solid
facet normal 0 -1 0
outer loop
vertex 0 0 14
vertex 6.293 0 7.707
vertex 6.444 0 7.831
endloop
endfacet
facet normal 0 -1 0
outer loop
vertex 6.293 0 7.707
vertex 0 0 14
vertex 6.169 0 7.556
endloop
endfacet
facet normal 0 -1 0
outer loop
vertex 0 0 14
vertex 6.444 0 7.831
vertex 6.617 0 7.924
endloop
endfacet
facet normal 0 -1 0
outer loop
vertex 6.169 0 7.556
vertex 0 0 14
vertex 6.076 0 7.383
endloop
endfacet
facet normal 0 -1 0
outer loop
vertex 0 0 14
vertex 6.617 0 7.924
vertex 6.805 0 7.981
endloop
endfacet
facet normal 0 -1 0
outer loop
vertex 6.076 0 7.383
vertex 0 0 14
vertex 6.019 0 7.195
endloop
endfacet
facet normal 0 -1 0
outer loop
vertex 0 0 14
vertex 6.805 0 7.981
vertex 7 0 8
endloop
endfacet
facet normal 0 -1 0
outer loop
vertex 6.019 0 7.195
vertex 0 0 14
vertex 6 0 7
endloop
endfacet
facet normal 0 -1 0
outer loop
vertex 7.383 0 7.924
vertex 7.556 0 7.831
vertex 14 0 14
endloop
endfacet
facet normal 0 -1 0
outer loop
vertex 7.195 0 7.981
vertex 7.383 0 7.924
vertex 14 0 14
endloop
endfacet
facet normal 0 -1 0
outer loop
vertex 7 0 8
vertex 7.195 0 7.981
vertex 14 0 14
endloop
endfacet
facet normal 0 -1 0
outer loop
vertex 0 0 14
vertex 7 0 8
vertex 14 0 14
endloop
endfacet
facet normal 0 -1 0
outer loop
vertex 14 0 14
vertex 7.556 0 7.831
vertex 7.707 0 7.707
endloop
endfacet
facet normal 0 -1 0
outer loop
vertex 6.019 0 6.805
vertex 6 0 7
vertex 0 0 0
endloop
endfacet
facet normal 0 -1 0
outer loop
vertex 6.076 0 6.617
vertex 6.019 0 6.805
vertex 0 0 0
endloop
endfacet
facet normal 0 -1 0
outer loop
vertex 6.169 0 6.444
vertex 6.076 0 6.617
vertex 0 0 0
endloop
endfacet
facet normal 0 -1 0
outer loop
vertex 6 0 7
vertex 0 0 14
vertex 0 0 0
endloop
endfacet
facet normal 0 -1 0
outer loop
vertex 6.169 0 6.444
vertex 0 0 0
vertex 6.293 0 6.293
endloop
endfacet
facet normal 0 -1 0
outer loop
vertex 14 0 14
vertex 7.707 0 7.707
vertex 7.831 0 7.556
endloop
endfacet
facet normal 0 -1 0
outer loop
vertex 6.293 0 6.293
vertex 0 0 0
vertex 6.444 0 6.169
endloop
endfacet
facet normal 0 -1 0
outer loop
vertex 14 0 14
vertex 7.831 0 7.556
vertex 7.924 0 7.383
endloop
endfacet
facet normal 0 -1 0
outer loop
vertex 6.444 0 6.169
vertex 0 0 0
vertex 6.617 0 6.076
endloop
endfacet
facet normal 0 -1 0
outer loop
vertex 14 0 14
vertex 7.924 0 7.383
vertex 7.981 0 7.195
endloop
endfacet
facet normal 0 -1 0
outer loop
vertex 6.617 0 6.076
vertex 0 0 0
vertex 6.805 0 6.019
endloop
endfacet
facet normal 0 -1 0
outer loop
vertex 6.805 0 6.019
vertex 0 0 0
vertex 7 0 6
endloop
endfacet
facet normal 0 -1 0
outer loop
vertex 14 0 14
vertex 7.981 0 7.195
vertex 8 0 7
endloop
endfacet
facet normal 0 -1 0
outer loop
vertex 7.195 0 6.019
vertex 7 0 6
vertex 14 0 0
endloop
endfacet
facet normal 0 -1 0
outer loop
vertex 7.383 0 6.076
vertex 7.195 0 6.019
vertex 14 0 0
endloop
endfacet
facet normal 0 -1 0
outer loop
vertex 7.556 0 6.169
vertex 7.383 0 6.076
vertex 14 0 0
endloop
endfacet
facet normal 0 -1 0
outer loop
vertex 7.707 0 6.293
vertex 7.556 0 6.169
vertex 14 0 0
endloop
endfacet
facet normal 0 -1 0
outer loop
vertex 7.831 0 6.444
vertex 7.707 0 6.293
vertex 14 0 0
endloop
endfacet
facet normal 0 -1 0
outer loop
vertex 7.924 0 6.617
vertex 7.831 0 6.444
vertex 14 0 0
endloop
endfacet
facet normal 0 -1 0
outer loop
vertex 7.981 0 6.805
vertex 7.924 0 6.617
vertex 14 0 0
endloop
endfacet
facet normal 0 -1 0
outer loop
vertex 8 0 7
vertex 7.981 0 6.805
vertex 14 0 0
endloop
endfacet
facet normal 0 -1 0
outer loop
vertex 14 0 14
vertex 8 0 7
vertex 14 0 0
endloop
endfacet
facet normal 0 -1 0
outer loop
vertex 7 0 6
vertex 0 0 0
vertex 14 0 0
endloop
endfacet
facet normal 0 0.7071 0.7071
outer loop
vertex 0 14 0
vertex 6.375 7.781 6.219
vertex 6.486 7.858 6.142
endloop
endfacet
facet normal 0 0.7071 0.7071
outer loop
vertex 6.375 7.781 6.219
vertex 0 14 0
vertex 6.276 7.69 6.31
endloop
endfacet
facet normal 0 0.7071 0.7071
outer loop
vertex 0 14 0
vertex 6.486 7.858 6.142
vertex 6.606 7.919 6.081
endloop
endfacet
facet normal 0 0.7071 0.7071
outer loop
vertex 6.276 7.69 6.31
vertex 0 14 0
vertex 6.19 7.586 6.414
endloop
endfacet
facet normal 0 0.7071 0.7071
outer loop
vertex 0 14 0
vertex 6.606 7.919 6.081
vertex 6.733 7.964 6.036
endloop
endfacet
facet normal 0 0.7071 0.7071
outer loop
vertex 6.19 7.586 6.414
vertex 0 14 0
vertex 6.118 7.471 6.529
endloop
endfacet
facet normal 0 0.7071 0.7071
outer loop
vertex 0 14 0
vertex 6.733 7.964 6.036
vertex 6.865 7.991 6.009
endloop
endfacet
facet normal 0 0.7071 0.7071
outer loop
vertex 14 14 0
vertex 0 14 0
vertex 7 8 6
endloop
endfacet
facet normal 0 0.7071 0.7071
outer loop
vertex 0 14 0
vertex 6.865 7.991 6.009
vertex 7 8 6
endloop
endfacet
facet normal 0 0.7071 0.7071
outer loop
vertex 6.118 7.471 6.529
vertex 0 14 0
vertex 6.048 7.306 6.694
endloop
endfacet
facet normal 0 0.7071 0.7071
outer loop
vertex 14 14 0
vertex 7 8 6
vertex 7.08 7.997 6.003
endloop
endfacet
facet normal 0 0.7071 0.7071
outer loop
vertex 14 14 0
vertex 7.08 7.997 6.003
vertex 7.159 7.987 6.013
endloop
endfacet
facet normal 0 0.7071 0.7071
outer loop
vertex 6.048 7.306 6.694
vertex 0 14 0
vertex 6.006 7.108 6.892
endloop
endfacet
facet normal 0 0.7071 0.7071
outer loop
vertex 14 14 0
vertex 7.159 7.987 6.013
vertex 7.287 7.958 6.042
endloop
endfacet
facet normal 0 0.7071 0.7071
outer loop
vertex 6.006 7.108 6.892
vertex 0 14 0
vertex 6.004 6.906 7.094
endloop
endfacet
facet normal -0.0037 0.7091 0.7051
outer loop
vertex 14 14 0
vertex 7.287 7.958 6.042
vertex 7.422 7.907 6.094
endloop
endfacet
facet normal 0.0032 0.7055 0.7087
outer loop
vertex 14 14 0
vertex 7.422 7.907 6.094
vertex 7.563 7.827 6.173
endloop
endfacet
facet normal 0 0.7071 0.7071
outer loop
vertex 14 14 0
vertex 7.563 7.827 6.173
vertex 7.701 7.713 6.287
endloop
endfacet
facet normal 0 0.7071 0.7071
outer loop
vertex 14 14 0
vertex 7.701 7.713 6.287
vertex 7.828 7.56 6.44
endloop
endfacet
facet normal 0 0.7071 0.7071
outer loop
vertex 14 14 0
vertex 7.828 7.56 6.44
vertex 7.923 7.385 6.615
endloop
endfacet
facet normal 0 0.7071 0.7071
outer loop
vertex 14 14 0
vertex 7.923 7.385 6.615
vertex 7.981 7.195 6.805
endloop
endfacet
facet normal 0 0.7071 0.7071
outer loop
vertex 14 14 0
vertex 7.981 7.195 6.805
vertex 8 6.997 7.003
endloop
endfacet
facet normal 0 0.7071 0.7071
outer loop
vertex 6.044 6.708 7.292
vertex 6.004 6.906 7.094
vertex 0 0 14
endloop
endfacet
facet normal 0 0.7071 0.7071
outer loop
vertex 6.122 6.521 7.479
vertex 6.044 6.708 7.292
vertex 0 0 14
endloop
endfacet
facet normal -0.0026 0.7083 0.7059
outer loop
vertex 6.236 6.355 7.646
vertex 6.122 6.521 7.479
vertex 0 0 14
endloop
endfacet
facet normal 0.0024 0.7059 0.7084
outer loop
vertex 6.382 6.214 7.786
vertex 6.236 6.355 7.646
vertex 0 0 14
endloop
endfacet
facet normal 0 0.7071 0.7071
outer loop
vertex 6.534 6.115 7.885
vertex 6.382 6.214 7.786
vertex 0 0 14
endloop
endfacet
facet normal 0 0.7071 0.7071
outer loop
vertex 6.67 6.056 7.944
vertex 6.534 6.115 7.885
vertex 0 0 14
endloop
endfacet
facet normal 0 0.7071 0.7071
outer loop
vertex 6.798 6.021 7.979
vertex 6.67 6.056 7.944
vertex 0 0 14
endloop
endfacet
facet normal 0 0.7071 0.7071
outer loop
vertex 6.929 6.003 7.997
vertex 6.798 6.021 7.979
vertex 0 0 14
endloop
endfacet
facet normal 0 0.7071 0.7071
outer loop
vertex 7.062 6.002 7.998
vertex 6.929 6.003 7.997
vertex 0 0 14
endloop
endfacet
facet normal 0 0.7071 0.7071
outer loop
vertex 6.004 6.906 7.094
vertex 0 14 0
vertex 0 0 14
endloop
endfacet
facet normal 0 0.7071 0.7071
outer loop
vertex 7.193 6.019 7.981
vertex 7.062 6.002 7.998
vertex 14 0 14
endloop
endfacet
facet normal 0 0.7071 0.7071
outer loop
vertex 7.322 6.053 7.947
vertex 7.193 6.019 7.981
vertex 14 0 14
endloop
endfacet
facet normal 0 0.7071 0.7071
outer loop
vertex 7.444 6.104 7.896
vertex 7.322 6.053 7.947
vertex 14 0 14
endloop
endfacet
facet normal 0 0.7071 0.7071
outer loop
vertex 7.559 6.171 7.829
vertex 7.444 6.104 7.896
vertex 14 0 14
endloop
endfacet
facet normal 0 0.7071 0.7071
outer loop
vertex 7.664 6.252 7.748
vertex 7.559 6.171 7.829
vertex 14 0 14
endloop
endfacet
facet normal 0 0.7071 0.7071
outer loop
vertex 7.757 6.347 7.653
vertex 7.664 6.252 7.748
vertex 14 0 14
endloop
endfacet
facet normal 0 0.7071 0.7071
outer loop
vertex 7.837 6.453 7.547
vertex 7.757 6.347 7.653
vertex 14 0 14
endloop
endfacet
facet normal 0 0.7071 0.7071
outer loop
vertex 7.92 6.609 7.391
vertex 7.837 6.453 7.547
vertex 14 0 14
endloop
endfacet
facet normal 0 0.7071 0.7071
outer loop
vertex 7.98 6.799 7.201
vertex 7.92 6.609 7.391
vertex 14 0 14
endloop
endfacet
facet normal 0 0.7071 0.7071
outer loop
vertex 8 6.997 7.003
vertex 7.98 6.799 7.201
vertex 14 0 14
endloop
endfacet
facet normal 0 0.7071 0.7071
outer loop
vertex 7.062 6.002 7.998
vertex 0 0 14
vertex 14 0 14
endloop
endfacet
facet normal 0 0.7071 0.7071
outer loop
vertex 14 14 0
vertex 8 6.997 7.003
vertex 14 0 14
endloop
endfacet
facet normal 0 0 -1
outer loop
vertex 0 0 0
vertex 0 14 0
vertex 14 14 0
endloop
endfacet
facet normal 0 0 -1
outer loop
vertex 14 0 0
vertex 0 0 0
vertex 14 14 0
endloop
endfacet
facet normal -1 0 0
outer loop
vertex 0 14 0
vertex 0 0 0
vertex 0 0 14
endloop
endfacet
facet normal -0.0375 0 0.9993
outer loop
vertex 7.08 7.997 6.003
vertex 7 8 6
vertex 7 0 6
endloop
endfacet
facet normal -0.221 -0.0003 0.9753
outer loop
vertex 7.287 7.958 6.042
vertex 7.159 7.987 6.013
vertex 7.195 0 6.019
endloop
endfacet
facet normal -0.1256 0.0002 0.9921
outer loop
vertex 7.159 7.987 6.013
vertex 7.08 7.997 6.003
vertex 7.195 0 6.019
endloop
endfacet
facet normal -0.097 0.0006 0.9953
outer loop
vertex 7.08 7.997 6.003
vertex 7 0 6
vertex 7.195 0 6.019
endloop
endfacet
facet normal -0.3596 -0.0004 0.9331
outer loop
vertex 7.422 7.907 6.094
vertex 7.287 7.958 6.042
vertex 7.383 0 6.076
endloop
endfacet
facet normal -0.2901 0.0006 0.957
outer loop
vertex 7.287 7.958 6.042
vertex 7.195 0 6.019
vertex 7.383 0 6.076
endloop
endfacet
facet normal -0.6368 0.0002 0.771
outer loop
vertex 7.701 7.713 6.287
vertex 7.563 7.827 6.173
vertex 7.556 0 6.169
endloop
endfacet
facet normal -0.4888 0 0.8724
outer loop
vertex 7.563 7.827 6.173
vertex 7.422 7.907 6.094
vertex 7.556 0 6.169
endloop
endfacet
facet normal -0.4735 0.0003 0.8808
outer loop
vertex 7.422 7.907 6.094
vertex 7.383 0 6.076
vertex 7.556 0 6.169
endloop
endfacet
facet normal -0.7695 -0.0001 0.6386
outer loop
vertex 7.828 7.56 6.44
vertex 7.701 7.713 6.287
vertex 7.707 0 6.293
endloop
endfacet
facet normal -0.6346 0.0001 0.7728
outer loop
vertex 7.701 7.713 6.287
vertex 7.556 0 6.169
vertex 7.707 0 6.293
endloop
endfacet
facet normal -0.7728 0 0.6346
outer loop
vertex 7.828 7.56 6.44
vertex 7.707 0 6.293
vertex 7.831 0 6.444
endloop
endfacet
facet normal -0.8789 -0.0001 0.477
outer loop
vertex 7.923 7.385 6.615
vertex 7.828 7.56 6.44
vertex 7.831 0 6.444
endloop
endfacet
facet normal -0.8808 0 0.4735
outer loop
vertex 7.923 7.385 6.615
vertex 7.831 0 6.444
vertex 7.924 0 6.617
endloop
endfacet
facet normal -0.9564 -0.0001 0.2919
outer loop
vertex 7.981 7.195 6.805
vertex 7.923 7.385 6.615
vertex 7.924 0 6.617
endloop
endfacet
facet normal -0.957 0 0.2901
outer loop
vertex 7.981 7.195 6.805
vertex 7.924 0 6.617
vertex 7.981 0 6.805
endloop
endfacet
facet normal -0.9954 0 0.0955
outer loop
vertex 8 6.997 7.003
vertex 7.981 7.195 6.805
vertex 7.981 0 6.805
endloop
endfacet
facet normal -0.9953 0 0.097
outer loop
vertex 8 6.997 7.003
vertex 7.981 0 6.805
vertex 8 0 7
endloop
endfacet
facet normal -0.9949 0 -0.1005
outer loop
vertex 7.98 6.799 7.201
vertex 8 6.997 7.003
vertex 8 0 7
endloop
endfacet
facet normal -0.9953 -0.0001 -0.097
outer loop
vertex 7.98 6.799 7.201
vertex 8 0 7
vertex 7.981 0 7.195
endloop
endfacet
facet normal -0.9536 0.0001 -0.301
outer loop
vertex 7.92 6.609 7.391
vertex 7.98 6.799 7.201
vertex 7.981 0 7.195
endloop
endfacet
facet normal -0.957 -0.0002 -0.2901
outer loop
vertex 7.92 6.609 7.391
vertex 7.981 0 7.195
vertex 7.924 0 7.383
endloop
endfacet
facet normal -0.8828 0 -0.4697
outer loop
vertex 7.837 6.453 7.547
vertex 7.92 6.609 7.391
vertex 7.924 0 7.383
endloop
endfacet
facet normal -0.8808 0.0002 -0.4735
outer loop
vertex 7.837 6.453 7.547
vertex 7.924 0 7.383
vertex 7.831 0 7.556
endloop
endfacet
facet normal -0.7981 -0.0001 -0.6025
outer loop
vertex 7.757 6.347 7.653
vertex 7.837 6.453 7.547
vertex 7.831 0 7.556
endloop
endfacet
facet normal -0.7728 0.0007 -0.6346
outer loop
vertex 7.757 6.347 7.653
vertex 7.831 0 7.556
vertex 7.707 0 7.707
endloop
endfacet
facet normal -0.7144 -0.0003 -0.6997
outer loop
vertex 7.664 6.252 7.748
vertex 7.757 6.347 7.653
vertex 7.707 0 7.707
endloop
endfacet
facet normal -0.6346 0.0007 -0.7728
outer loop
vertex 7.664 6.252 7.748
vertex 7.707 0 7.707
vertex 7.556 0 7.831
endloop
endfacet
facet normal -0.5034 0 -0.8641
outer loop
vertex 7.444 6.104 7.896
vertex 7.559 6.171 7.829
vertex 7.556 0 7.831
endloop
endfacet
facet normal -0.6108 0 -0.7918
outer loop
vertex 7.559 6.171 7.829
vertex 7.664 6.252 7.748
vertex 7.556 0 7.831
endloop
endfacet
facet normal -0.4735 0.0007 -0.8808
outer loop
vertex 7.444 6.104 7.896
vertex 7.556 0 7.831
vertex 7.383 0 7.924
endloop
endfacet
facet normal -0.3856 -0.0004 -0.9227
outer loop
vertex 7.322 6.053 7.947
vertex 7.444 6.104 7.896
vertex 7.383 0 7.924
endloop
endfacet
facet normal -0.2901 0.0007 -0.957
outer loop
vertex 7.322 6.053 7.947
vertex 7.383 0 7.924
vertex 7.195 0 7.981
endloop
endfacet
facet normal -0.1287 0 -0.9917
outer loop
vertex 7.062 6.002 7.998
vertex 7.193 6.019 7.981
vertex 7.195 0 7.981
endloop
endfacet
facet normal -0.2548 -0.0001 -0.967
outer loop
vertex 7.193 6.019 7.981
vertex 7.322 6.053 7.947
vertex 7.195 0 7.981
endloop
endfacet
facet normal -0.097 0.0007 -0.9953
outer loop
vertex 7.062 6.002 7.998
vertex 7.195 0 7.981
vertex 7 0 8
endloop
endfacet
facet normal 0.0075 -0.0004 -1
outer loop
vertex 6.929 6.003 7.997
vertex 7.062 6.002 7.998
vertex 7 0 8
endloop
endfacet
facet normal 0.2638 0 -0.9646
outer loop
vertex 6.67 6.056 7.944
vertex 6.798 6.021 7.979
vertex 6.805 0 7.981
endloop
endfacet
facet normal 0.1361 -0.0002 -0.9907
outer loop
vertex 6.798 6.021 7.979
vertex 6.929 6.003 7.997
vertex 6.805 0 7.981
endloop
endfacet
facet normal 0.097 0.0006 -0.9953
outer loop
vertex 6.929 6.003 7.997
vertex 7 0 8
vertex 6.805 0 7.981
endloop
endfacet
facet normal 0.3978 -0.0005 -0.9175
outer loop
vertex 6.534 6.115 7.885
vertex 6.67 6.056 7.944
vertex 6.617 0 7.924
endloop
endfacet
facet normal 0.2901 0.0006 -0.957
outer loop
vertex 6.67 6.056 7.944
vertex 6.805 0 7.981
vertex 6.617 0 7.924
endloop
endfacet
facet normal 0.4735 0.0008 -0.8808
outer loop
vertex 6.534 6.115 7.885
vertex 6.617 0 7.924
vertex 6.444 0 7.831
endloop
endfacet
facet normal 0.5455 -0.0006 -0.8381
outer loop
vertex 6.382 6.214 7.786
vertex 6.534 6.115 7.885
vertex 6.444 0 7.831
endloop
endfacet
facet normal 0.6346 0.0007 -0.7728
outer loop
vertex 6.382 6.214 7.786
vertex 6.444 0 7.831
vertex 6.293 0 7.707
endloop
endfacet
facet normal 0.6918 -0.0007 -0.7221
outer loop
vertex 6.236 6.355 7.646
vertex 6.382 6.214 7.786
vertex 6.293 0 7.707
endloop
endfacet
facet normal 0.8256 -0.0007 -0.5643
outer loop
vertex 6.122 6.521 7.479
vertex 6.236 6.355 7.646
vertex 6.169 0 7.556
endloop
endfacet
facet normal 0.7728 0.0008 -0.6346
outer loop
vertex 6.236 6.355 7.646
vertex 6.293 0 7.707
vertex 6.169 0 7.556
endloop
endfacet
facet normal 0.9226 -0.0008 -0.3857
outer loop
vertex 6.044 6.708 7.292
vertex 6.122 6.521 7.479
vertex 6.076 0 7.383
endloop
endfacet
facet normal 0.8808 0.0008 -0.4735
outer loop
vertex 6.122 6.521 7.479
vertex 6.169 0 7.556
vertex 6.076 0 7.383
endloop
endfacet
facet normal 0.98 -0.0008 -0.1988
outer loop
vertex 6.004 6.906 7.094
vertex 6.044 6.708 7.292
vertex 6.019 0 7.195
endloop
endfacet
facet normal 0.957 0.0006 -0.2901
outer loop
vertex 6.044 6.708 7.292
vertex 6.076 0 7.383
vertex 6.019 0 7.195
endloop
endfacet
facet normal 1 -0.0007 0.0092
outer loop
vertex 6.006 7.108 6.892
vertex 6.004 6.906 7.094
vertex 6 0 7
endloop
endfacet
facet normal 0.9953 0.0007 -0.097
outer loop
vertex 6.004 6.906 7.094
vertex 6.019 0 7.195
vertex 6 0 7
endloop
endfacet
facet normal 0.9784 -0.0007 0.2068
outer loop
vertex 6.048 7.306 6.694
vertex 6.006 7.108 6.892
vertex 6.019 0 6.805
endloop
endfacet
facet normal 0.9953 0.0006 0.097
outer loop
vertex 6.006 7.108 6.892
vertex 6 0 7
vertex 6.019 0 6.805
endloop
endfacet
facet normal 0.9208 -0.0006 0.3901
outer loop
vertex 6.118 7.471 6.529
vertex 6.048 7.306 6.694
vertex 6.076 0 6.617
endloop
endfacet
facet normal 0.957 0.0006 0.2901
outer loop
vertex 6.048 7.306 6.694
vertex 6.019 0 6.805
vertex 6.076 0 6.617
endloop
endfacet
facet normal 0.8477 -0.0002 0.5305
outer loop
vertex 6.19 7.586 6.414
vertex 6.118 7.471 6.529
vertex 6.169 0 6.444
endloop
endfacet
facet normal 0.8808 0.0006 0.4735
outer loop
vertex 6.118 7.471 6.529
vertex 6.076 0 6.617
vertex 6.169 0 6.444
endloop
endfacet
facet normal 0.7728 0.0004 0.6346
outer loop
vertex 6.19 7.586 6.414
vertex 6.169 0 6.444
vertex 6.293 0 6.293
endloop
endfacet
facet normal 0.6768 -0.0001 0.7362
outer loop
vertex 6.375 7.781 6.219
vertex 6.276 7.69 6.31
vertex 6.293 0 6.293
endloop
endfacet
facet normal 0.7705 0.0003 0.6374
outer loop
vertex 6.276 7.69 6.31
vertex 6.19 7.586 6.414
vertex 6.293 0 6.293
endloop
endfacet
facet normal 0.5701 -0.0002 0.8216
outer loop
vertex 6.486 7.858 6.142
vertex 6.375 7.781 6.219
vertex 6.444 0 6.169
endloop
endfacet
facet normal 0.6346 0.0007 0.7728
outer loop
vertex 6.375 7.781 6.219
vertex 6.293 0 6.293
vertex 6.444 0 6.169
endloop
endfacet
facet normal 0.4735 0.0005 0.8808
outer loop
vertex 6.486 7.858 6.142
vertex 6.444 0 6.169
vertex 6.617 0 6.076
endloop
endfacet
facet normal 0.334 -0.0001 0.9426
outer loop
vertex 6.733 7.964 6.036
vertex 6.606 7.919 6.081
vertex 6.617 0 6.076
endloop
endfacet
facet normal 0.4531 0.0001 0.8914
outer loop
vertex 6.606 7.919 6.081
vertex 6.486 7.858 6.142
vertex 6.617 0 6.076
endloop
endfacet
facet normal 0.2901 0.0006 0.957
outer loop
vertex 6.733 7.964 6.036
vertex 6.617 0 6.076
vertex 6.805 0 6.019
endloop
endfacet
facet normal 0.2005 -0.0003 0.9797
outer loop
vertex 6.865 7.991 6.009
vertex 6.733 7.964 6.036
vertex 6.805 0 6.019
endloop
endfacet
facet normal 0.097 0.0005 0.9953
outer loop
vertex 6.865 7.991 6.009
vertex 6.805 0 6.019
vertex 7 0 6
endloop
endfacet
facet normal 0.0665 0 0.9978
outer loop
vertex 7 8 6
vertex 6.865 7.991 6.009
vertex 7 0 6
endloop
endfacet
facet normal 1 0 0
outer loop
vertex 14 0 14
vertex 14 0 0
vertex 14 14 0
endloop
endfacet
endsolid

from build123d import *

# Parameters (mm, degrees)
ESQUISSE1_W             = 14
ESQUISSE1_H             = 14
EXTRUSION1_DEPTH        = 14
CHANFREIN1_SIZE         = 14
ESQUISSE2_R             = 1
ENL_V_MAT_EXTRU_1_DEPTH = 25.248711306


with BuildPart() as part:
    # Esquisse1 → Extrusion1 (new body)
    with BuildSketch(Plane.XY):
        with Locations((7, 7)):
            Rectangle(ESQUISSE1_W, ESQUISSE1_H)
    extrude(amount=EXTRUSION1_DEPTH)

    # Chanfrein1
    chanfrein1_edges = [part.edges().sort_by_distance(p)[0] for p in [
        (7, 14, 14),
    ]]
    chamfer(chanfrein1_edges, length=CHANFREIN1_SIZE - 0.0001)  # a hair under: the kernel refuses the full size

    # Esquisse2 → Enlèv. mat.-Extru.1 (cut, through all)
    with BuildSketch(Plane.XZ):
        with Locations(Location((7, 7, 0), (0, 0, 270))):
            Circle(ESQUISSE2_R)
    extrude(amount=-ENL_V_MAT_EXTRU_1_DEPTH, mode=Mode.SUBTRACT)


solid = part.part
